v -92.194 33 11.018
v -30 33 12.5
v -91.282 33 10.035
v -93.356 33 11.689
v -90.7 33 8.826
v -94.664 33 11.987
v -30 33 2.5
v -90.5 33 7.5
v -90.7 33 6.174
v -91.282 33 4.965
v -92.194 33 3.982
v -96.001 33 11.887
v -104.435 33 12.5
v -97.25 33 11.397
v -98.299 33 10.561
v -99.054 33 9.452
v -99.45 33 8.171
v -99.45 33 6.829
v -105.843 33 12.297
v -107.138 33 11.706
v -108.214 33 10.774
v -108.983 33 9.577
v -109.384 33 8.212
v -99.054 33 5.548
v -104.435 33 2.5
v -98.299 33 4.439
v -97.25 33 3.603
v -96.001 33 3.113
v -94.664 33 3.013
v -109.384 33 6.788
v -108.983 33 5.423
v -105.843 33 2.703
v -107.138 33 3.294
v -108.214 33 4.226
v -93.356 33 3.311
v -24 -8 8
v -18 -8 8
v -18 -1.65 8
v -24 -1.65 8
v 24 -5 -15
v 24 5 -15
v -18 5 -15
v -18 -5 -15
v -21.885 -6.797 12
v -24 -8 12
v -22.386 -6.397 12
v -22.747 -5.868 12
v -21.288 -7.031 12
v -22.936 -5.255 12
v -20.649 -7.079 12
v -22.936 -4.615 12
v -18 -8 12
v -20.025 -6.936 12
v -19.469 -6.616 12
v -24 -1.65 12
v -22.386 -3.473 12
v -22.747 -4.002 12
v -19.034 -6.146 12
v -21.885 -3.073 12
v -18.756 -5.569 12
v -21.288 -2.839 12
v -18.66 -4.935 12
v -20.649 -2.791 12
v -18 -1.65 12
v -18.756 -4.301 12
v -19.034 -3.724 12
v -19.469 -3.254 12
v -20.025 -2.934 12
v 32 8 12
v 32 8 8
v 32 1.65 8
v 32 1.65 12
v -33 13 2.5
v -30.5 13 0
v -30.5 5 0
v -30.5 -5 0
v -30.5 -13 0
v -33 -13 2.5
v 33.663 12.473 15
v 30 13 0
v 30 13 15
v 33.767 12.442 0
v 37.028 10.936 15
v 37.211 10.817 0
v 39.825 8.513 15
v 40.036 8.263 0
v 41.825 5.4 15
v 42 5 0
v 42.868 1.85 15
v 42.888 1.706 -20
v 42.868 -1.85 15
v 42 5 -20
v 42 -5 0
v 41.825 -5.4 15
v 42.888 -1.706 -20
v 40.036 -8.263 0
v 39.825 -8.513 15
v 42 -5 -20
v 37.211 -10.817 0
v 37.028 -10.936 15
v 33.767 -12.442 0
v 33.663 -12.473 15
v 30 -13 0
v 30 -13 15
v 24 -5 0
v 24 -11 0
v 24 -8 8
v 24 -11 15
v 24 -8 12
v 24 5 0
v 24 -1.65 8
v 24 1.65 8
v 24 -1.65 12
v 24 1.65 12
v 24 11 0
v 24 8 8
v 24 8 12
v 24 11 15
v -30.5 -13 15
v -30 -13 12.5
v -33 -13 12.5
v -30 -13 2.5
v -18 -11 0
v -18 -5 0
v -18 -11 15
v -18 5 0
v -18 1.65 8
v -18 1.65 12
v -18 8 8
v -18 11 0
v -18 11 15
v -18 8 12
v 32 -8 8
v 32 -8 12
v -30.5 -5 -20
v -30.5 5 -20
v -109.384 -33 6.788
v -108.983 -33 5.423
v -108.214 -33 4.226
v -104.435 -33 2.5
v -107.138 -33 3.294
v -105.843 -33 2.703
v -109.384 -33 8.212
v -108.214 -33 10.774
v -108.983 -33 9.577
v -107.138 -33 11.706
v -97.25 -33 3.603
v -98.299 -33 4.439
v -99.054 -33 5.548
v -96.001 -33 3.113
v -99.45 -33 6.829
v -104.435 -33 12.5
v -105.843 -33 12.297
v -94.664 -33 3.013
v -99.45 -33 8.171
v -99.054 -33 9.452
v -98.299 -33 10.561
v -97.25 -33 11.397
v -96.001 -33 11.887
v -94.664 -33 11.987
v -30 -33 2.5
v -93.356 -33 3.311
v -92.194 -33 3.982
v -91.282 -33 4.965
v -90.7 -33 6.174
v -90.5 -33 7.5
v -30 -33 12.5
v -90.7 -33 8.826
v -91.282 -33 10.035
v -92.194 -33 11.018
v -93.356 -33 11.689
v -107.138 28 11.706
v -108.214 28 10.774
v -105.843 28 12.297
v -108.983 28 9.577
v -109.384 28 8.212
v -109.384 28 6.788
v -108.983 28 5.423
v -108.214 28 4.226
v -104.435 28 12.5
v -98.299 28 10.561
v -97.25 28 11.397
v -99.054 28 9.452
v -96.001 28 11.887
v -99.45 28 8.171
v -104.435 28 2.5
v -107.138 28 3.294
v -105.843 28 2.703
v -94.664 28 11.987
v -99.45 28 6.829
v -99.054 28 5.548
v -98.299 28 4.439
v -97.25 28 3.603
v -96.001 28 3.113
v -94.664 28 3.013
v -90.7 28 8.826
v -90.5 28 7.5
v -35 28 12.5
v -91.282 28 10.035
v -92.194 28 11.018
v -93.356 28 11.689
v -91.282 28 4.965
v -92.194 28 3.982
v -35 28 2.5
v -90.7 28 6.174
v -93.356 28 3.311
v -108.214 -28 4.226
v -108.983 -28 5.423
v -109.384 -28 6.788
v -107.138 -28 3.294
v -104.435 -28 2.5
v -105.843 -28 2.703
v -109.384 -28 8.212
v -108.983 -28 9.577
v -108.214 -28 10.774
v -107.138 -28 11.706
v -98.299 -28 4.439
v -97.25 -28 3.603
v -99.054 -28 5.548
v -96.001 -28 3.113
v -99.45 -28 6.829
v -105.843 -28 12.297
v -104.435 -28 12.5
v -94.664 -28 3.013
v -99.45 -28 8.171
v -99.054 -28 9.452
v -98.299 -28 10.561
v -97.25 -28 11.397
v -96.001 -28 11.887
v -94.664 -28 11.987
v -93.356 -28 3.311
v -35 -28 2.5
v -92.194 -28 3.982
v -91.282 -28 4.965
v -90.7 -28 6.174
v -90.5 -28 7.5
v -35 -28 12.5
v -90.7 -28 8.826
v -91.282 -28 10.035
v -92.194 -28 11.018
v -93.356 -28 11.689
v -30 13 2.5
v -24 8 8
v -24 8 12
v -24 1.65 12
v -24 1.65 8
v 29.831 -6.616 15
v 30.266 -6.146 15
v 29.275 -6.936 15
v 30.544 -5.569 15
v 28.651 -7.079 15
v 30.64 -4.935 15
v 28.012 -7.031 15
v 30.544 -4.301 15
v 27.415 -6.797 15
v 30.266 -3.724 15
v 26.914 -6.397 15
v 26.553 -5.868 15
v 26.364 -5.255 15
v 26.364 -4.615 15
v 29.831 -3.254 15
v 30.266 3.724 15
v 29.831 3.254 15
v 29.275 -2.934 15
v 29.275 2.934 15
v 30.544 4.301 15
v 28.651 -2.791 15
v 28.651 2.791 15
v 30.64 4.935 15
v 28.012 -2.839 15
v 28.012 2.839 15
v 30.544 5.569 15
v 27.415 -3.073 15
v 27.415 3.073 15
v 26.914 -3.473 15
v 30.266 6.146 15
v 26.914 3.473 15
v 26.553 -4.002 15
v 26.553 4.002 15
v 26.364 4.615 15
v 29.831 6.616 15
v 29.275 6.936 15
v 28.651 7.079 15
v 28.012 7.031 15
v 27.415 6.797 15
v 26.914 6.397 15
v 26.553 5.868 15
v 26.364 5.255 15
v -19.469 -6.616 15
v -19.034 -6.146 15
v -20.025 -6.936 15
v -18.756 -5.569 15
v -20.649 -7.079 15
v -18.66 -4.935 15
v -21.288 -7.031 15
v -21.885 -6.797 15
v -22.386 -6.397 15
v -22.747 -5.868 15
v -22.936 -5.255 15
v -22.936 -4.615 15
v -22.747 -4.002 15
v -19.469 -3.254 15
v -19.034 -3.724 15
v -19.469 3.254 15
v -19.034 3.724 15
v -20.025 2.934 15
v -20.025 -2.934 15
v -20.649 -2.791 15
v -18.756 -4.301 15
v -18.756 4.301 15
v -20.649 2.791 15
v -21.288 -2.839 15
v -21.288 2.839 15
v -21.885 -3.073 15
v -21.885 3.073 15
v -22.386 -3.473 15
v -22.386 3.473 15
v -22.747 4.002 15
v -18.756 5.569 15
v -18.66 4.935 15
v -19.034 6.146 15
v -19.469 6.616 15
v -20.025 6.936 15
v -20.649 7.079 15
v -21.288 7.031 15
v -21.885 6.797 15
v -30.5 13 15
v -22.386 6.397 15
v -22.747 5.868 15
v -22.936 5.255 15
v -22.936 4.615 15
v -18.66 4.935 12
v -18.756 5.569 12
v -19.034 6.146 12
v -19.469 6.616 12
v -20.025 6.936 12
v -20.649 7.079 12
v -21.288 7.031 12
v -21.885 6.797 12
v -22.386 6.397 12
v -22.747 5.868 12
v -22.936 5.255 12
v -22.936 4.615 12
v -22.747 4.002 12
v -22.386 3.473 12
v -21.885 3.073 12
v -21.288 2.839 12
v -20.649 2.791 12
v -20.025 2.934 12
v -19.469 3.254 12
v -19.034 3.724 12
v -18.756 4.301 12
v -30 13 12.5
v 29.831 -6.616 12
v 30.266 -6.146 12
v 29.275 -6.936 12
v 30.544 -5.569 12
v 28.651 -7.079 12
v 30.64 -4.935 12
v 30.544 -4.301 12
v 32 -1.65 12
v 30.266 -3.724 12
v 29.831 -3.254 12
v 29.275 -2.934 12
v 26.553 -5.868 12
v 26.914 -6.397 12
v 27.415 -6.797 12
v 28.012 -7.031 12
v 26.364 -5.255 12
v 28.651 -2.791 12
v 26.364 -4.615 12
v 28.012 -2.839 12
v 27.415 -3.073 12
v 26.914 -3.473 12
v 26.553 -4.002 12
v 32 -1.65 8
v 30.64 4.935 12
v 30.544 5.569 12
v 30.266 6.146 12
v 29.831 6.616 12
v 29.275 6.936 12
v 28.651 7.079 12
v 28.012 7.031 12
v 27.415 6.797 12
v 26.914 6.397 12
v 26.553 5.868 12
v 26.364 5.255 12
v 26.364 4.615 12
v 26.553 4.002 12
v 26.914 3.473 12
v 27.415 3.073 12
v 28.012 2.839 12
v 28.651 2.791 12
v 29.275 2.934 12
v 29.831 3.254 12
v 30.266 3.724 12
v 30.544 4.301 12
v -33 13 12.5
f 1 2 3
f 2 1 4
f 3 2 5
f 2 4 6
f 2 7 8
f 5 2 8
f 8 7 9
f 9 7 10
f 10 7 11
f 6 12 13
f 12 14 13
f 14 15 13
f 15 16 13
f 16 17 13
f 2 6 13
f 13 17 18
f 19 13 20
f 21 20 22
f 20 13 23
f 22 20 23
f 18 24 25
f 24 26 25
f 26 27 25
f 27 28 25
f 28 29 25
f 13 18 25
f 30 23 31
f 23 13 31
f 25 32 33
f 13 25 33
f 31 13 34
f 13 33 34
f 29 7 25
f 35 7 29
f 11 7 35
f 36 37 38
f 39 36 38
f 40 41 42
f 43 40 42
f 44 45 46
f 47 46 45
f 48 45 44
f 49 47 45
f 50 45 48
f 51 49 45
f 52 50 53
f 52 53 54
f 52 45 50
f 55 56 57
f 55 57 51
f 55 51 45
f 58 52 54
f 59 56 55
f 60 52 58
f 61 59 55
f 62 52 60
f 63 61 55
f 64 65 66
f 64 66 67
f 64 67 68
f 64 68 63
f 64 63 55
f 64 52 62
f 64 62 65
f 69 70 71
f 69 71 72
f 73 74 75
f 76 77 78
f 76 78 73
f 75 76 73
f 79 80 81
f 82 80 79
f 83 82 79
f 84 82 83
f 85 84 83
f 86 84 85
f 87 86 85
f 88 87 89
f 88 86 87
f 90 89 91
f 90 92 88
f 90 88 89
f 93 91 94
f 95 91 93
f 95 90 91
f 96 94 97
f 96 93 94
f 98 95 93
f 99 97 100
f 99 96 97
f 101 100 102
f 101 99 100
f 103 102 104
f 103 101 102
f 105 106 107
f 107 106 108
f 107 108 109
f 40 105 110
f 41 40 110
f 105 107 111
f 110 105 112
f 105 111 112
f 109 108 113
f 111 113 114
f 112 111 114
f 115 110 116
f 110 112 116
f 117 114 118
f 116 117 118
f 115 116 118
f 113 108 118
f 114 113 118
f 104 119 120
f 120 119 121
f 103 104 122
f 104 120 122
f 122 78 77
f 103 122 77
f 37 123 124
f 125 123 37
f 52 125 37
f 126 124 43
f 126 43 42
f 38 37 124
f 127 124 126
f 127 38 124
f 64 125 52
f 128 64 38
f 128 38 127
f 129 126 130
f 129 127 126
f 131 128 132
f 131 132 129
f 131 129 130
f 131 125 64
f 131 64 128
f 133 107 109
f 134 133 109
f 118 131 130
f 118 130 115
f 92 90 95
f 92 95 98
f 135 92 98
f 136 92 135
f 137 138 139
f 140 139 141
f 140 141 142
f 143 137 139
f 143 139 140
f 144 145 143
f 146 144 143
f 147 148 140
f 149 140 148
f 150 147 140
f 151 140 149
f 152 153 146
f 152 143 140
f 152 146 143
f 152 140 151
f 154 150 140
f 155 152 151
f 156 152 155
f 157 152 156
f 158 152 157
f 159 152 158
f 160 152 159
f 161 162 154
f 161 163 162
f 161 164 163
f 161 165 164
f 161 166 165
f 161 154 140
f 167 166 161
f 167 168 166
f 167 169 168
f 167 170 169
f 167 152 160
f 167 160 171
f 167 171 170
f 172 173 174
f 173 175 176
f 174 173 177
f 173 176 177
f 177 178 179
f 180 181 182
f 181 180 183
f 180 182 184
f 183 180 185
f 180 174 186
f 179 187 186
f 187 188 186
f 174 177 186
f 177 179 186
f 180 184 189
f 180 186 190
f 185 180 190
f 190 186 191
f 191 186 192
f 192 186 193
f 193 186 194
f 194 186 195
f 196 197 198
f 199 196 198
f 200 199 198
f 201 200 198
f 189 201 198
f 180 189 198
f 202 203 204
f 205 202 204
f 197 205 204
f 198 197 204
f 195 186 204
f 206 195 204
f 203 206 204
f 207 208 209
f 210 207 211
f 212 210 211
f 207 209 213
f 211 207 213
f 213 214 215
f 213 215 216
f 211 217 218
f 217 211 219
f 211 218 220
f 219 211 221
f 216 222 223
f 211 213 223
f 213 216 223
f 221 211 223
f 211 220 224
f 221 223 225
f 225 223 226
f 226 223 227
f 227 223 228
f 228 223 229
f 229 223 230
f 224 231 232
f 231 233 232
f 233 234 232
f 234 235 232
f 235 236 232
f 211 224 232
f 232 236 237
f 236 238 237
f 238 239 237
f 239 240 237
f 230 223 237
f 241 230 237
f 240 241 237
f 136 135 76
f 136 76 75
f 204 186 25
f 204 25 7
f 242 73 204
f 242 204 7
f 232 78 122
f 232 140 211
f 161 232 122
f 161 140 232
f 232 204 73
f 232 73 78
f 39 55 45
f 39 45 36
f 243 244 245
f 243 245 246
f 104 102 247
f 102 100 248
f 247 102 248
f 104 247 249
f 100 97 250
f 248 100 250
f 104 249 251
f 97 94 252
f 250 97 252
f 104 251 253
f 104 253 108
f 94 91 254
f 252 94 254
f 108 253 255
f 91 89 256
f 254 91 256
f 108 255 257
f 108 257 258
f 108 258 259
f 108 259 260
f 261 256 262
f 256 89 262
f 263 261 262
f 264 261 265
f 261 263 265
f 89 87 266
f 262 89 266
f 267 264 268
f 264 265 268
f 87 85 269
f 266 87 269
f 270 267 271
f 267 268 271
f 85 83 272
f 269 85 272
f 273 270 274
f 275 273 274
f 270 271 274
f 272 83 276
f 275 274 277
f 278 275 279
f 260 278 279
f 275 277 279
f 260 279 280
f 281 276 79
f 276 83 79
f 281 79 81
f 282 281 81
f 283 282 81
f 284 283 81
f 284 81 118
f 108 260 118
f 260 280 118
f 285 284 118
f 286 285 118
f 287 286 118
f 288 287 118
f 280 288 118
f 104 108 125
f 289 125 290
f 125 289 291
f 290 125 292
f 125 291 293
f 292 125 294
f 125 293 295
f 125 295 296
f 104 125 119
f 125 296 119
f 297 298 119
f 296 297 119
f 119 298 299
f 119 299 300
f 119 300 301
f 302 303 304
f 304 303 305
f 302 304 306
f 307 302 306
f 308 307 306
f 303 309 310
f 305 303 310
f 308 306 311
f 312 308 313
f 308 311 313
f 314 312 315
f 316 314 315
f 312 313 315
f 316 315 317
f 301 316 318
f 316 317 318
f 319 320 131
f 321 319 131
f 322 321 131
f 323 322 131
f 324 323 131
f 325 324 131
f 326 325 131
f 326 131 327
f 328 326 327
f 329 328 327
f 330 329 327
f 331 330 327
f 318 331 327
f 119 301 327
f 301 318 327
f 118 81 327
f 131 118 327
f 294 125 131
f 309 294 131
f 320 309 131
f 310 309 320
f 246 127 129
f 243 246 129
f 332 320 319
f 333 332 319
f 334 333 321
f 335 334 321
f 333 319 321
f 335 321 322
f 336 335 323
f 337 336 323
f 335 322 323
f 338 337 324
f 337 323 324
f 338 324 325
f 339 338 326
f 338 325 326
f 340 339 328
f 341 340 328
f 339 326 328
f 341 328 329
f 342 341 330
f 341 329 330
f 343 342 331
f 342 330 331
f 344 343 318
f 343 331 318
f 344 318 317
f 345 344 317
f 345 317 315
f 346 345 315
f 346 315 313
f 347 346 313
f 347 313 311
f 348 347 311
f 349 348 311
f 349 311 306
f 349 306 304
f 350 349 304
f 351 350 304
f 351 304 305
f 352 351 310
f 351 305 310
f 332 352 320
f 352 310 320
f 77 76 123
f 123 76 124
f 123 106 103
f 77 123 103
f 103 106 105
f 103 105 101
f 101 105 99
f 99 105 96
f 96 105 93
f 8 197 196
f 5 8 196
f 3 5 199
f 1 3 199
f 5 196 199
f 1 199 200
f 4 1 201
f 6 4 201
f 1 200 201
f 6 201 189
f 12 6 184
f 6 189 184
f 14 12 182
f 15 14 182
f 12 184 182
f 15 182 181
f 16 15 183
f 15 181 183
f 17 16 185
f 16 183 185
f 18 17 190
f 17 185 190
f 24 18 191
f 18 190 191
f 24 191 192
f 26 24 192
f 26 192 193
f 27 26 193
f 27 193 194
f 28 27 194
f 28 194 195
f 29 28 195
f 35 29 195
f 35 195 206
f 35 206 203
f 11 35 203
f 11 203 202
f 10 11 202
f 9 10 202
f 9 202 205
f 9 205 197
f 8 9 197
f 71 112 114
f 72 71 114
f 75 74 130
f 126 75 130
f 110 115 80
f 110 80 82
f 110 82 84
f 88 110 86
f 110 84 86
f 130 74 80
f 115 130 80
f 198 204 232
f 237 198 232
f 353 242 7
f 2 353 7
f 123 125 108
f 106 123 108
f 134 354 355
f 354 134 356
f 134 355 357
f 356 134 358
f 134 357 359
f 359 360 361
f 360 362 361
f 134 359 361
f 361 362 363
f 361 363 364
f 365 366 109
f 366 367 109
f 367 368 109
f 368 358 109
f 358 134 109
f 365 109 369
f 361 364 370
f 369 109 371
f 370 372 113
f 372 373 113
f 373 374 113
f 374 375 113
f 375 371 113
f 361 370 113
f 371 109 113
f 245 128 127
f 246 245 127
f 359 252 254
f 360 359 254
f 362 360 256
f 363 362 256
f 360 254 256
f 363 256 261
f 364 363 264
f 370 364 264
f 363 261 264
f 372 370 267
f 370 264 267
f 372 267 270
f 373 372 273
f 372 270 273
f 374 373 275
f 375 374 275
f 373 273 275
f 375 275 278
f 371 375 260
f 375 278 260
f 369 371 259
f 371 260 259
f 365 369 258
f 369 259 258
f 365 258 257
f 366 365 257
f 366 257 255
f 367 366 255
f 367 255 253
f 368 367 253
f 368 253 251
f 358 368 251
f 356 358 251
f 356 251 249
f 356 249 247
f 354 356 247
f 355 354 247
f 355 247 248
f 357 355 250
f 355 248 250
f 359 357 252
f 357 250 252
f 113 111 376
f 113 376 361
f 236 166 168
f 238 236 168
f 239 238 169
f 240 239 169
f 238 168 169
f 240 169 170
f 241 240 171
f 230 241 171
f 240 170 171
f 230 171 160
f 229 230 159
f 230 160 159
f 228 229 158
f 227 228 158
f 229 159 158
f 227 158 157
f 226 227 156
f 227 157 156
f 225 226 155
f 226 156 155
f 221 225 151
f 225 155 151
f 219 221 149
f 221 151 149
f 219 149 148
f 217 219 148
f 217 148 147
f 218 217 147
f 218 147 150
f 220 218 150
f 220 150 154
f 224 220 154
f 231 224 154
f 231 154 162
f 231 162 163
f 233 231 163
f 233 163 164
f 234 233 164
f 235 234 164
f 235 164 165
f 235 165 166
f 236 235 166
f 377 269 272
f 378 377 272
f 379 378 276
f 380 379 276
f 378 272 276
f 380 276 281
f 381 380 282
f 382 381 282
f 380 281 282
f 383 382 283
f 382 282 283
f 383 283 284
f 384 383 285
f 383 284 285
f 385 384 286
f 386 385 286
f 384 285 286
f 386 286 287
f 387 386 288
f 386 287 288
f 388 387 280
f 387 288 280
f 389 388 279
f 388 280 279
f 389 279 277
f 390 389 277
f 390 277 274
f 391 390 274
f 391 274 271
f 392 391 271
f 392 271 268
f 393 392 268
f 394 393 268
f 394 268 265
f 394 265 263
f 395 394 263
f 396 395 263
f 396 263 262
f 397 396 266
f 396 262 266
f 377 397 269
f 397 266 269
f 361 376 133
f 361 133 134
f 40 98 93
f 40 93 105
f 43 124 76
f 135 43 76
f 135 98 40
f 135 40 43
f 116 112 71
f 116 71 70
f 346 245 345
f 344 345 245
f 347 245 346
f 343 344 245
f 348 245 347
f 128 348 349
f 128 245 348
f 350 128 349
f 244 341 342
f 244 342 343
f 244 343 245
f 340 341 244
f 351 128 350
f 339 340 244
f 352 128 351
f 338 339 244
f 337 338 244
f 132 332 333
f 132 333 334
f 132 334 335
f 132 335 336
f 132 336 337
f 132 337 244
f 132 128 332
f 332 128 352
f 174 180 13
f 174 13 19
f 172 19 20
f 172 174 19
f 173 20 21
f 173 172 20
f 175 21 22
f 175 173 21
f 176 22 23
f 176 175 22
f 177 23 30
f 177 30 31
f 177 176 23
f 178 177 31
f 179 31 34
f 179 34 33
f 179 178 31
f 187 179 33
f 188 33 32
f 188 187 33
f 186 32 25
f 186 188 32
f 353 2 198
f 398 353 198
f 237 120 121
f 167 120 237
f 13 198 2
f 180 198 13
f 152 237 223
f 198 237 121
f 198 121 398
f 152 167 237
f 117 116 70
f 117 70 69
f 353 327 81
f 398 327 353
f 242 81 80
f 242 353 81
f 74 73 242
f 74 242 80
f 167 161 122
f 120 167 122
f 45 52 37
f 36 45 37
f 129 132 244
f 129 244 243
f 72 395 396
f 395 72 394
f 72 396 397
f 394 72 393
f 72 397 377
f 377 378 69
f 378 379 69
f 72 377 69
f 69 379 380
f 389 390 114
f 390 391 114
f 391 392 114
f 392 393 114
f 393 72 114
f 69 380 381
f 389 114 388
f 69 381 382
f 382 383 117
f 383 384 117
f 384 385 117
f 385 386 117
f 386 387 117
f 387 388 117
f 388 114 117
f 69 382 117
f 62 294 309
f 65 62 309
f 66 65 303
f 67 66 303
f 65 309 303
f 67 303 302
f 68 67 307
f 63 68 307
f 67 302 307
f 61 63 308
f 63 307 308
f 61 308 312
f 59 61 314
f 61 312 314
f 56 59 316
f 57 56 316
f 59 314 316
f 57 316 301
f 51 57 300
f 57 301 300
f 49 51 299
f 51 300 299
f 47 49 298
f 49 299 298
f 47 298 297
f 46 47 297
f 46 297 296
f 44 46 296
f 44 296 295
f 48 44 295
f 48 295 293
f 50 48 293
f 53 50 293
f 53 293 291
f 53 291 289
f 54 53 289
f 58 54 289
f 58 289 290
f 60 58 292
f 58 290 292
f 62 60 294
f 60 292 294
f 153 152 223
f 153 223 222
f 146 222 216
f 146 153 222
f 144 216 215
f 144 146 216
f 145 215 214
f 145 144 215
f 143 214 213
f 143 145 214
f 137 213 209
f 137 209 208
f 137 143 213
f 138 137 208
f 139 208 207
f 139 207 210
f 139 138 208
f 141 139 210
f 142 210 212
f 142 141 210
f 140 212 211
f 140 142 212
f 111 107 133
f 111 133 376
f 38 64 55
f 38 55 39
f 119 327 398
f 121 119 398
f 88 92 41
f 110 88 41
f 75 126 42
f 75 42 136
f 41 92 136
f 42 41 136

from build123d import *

# Parameters (mm, degrees)
BOSS_EXTRU_1_DEPTH      = 15
ESQUISSE2_W             = 42
ESQUISSE2_H             = 22
ENL_V_MAT_EXTRU_1_DEPTH = 48.360320945
ESQUISSE4_R             = 2.15
ENL_V_MAT_EXTRU_2_DEPTH = 3
ESQUISSE5_W             = 4
ESQUISSE5_H             = 6.35
ENL_V_MAT_EXTRU_3_DEPTH = 6
ESQUISSE6_W             = 4
ESQUISSE6_H             = 6.35
ENL_V_MAT_EXTRU_4_DEPTH = 8
BOSS_EXTRU_2_DEPTH      = 5
BOSS_EXTRU_2_DEPTH_BACK = 5
CHANFREIN1_SIZE         = 3
BOSS_EXTRU_4_DEPTH      = 5
BOSS_EXTRU_6_START      = 20
ESQUISSE13_W            = 12.5
ESQUISSE13_H            = 10
BOSS_EXTRU_6_DEPTH      = 20
ESQUISSE14_W            = 42
ESQUISSE14_H            = 10
BOSS_EXTRU_7_DEPTH      = 5
BOSS_EXTRU_8_START      = -5
BOSS_EXTRU_8_DEPTH      = 5
ESQUISSE17_R            = 4.5
ENL_V_MAT_EXTRU_5_DEPTH = 130.352109985


with BuildPart() as part:
    # Esquisse1 → Boss.-Extru.1 (new body)
    with BuildSketch(Plane.XY):
        with BuildLine():
            Line((30, -13), (-30, -13))
            Line((-30, -13), (-30, 13))
            Line((-30, 13), (30, 13))
            ThreePointArc((30, 13), (43, 0), (30, -13))
        make_face()
    extrude(amount=BOSS_EXTRU_1_DEPTH)

    # Esquisse2 → Enlèv. mat.-Extru.1 (cut, through all)
    with BuildSketch(Plane.XY.offset(15)):
        with Locations((3, 0)):
            Rectangle(ESQUISSE2_W, ESQUISSE2_H)
    extrude(amount=-ENL_V_MAT_EXTRU_1_DEPTH, mode=Mode.SUBTRACT)

    # Esquisse4 → Enlèv. mat.-Extru.2 (cut)
    with BuildSketch(Plane.XY.offset(15)):
        with Locations((-20.81, 4.935)):
            Circle(ESQUISSE4_R)
        with Locations((-20.81, -4.935)):
            Circle(ESQUISSE4_R)
        with Locations((28.49, 4.935)):
            Circle(ESQUISSE4_R)
        with Locations((28.49, -4.935)):
            Circle(ESQUISSE4_R)
    extrude(amount=-ENL_V_MAT_EXTRU_2_DEPTH, mode=Mode.SUBTRACT)

    # Esquisse5 → Enlèv. mat.-Extru.3 (cut)
    with BuildSketch(Plane(origin=(-18, 0, 0), x_dir=(0, 0, -1), z_dir=(1, 0, 0))):
        with Locations((-10, -4.825)):
            Rectangle(ESQUISSE5_W, ESQUISSE5_H)
        with Locations((-10, 4.825)):
            Rectangle(ESQUISSE5_W, ESQUISSE5_H)
    extrude(amount=-ENL_V_MAT_EXTRU_3_DEPTH, mode=Mode.SUBTRACT)

    # Esquisse6 → Enlèv. mat.-Extru.4 (cut)
    with BuildSketch(Plane.ZY.offset(-24)):
        with Locations((10, 4.825)):
            Rectangle(ESQUISSE6_W, ESQUISSE6_H)
        with Locations((10, -4.825)):
            Rectangle(ESQUISSE6_W, ESQUISSE6_H)
    extrude(amount=-ENL_V_MAT_EXTRU_4_DEPTH, mode=Mode.SUBTRACT)

    # Esquisse9 → Boss.-Extru.2 (add, two sides: drawn at the far end of the back side and taken through both)
    with BuildSketch(Plane.XY.offset(7.5).offset(-BOSS_EXTRU_2_DEPTH_BACK)):
        Polygon((-30, -33), (-30, 33), (-95, 33), (-95, 28), (-35, 28), (-35, -28), (-95, -28), (-95, -33), align=None)
    extrude(amount=BOSS_EXTRU_2_DEPTH + BOSS_EXTRU_2_DEPTH_BACK)

    # Chanfrein1
    # the kernel refuses this chamfer: 3 mm, written as the material it adds along each edge
    with BuildSketch(Plane(origin=(-30, -13, 12.5), x_dir=(0.02749587661058678, 0, 0.9996219169112968), z_dir=(0, 1, 0))) as chanfrein1_piece_1_section:
        Polygon((CHANFREIN1_SIZE * 0.999621916911, -CHANFREIN1_SIZE * 0.0274958766106), (-CHANFREIN1_SIZE * 0.0274958766106, -CHANFREIN1_SIZE * 0.999621916911), (0, 0), align=None)
    chanfrein1_piece_1 = extrude(amount=26, mode=Mode.PRIVATE)
    chanfrein1_piece_1 = split(chanfrein1_piece_1, bisect_by=Plane(origin=(-31.023809524, 0, 15), z_dir=(0, 0, -1)), keep=Keep.TOP, mode=Mode.PRIVATE)
    add(chanfrein1_piece_1)
    with BuildSketch(Plane(origin=(-30, -13, 2.5), x_dir=(0.027495876610586778, 0, -0.9996219169112968), z_dir=(0, 1, 0))) as chanfrein1_piece_2_section:
        Polygon((CHANFREIN1_SIZE * 0.999621916911, CHANFREIN1_SIZE * 0.0274958766106), (-CHANFREIN1_SIZE * 0.0274958766106, CHANFREIN1_SIZE * 0.999621916911), (0, 0), align=None)
    chanfrein1_piece_2 = extrude(amount=26, mode=Mode.PRIVATE)
    chanfrein1_piece_2 = split(chanfrein1_piece_2, bisect_by=Plane(origin=(-31.023809524, 0, 0), z_dir=(0, 0, 1)), keep=Keep.TOP, mode=Mode.PRIVATE)
    add(chanfrein1_piece_2)

    # Esquisse11 → Boss.-Extru.4 (add)
    with BuildSketch(Plane.XZ.offset(33)):
        with BuildLine():
            Line((-95, 2.5), (-95, 12.5))
            Line((-95, 12.5), (-104.43476759, 12.5))
            ThreePointArc((-104.43476759, 12.5), (-109.43476759, 7.5), (-104.43476759, 2.5))
            Line((-104.43476759, 2.5), (-95, 2.5))
        make_face()
    extrude(amount=-BOSS_EXTRU_4_DEPTH)

    # Esquisse13 → Boss.-Extru.6 (add)
    with BuildSketch(Plane(origin=(0, 0, 0), x_dir=(-1, 0, 0), z_dir=(0, 0, -1)).offset(BOSS_EXTRU_6_START)):
        with BuildLine():
            Line((-24, -5), (-24, 5))
            Line((-24, 5), (-42, 5))
            ThreePointArc((-42, 5), (-43, 0), (-42, -5))
            Line((-42, -5), (-24, -5))
        make_face()
        with Locations((24.25, 0)):
            Rectangle(ESQUISSE13_W, ESQUISSE13_H)
    extrude(amount=-BOSS_EXTRU_6_DEPTH)

    # Esquisse14 → Boss.-Extru.7 (add)
    with BuildSketch(Plane(origin=(0, 0, -20), x_dir=(-1, 0, 0), z_dir=(0, 0, -1))):
        with Locations((-3, 0)):
            Rectangle(ESQUISSE14_W, ESQUISSE14_H)
    extrude(amount=-BOSS_EXTRU_7_DEPTH)

    # Esquisse16 → Boss.-Extru.8 (add)
    with BuildSketch(Plane(origin=(0, 33, 0), x_dir=(1, 0, 0), z_dir=(0, 1, 0)).offset(BOSS_EXTRU_8_START)):
        with BuildLine():
            Line((-89.416041875, -12.5), (-104.43476759, -12.5))
            ThreePointArc((-104.43476759, -12.5), (-109.43476759, -7.5), (-104.43476759, -2.5))
            Line((-104.43476759, -2.5), (-89.416041875, -2.5))
            Line((-89.416041875, -2.5), (-89.416041875, -12.5))
        make_face()
    extrude(amount=BOSS_EXTRU_8_DEPTH)

    # Esquisse17 → Enlèv. mat.-Extru.5 (cut, through all)
    with BuildSketch(Plane.XZ.offset(33)):
        with Locations((-95, 7.5)):
            Circle(ESQUISSE17_R)
    extrude(amount=-ENL_V_MAT_EXTRU_5_DEPTH, mode=Mode.SUBTRACT)


solid = part.part
